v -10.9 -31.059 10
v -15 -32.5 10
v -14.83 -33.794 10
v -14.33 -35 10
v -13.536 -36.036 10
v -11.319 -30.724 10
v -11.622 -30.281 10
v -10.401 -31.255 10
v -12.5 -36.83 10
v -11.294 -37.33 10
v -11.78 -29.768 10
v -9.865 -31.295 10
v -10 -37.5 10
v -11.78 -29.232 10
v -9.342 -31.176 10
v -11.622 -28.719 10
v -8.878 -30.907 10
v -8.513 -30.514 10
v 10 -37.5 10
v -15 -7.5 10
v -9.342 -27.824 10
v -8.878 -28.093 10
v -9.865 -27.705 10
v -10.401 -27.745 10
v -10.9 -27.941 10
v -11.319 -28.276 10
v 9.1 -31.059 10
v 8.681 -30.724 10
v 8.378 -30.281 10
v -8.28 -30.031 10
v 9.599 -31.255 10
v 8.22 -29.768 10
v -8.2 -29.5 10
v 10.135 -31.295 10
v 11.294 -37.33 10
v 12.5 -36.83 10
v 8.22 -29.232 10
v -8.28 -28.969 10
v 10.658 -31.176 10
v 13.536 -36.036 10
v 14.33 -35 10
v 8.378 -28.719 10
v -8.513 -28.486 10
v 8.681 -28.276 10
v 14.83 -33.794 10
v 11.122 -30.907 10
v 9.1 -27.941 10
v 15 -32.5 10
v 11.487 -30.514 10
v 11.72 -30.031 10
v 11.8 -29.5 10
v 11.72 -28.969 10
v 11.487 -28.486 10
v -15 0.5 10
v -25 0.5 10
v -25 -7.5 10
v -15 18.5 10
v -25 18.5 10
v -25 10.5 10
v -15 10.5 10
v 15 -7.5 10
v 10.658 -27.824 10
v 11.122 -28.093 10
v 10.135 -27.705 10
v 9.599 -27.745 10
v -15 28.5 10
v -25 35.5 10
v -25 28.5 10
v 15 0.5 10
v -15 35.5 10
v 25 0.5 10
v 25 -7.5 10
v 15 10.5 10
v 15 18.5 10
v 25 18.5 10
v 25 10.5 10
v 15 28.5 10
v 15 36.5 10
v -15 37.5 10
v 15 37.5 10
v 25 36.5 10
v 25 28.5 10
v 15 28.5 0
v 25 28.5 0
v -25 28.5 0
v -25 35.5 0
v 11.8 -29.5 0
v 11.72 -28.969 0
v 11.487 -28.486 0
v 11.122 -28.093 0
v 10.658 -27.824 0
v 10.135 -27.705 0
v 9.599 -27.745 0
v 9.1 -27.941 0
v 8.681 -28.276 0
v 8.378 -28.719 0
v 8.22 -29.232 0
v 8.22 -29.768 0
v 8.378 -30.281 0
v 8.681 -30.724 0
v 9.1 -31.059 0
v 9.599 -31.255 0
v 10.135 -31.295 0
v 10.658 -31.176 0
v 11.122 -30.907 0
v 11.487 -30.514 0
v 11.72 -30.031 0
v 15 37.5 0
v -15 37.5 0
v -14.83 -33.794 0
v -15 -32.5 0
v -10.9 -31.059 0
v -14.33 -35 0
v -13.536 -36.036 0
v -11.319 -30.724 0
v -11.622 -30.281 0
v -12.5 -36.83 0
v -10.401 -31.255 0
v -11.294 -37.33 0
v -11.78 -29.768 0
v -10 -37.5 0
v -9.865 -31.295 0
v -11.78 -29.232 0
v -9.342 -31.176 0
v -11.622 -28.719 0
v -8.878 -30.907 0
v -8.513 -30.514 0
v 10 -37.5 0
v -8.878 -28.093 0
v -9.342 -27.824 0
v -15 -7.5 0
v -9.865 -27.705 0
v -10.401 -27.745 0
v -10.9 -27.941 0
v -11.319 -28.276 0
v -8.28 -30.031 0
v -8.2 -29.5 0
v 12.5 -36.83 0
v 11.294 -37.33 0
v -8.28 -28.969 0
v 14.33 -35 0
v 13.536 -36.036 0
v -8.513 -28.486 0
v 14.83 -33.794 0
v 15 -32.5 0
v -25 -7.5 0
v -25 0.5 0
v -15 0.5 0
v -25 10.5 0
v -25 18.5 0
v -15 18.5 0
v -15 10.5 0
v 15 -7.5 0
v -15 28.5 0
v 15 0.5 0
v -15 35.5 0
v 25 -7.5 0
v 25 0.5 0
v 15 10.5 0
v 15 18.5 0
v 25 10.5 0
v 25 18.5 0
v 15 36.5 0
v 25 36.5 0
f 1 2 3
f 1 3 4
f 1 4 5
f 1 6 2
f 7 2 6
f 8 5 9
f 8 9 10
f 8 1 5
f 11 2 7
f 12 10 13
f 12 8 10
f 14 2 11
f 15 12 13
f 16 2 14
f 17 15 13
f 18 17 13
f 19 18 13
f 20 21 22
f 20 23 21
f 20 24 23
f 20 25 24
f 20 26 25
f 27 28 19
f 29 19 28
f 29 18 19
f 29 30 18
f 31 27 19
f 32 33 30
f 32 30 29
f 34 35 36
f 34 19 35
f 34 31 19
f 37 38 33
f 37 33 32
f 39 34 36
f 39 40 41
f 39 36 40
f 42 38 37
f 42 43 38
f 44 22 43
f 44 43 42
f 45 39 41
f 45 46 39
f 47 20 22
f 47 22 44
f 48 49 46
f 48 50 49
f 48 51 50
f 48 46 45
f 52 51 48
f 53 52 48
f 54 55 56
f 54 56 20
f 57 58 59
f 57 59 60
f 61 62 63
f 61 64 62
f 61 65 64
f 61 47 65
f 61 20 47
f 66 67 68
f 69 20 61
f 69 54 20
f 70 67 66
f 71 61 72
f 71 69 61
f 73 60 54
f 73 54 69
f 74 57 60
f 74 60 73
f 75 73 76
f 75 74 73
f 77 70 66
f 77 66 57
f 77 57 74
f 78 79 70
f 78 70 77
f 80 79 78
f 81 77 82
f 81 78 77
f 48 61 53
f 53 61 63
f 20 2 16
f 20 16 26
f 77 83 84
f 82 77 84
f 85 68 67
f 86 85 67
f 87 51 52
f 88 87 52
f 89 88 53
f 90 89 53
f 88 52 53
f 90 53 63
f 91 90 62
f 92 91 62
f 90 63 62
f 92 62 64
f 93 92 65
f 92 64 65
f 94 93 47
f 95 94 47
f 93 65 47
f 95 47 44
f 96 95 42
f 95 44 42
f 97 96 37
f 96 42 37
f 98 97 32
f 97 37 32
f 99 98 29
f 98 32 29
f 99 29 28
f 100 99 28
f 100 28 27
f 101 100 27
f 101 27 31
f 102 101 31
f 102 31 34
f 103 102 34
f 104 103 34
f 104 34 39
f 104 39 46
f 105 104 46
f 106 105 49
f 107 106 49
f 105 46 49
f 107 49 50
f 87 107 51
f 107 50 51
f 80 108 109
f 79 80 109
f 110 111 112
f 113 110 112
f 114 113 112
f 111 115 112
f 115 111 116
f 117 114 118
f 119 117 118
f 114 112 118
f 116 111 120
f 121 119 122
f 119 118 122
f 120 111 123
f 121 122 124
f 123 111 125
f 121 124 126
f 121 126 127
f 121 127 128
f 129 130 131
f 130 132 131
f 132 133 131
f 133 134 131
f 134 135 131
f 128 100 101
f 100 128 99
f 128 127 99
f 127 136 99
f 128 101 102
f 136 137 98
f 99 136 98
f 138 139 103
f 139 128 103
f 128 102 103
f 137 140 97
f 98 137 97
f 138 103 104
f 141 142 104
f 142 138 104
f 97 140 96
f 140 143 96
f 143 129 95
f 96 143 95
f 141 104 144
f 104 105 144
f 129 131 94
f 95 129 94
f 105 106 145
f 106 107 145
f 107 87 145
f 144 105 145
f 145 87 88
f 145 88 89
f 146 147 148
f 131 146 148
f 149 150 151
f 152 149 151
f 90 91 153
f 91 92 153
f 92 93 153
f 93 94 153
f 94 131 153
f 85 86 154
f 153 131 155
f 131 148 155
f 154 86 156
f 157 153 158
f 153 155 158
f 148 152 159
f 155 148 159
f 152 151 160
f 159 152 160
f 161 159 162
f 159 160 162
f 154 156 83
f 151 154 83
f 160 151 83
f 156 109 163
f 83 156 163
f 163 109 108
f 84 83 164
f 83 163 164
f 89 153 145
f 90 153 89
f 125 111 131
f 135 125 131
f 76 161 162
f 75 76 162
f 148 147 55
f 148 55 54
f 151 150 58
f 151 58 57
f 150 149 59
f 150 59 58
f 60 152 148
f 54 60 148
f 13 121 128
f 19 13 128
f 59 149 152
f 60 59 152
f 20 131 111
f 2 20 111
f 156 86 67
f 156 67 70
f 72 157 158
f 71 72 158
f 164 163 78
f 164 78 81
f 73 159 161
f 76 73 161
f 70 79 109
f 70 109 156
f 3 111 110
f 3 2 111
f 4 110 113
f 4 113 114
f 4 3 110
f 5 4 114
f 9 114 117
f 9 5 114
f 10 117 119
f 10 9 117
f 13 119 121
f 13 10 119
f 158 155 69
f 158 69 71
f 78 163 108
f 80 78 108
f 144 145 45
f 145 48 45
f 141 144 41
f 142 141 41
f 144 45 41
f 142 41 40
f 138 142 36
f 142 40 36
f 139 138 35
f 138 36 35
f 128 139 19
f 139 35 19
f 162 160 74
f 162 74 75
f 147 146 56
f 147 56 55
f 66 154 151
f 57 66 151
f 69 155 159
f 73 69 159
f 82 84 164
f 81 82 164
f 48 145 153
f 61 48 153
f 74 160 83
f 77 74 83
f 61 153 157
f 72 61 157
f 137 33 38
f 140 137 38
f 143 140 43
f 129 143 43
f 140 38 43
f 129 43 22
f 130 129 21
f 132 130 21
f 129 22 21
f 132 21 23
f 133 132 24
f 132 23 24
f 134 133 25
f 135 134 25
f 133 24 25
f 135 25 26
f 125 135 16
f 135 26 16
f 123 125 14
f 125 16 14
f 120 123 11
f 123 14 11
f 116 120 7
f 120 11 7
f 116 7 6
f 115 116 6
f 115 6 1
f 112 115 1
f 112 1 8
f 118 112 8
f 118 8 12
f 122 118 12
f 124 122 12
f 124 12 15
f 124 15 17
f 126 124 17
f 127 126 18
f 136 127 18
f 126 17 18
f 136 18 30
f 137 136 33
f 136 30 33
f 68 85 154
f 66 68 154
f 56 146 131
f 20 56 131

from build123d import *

# Parameters (mm, degrees)
F0_W     = 10
F0_H     = 8
F0_H_2   = 7
F1_DEPTH = 10
F2_R     = 1.8
F3_DEPTH = 10
F4_R     = 5


with BuildPart() as f1:
    # F0 (on Top) → F1 (new body)
    with BuildSketch(Plane.XY):
        Polygon((15, 36.5), (15, 37.5), (-15, 37.5), (-15, 35.5), (-15, 28.5), (-15, 18.5), (-15, 10.5), (-15, 0.5), (-15, -7.5), (-15, -37.5), (15, -37.5), (15, -7.5), (15, 0.5), (15, 10.5), (15, 18.5), (15, 28.5), align=None)
        with Locations((20, 32.5)):
            Rectangle(F0_W, F0_H)
        with Locations((-20, 32)):
            Rectangle(F0_W, F0_H_2)
        with Locations((20, 14.5)):
            Rectangle(F0_W, F0_H)
        with Locations((-20, 14.5)):
            Rectangle(F0_W, F0_H)
        with Locations((20, -3.5)):
            Rectangle(F0_W, F0_H)
        with Locations((-20, -3.5)):
            Rectangle(F0_W, F0_H)
    extrude(amount=F1_DEPTH)

    # F2 (on face) → F3 (cut)
    with BuildSketch(Plane.XY.offset(10)):
        with Locations((-10, -29.5)):
            Circle(F2_R)
        with Locations((10, -29.5)):
            Circle(F2_R)
    extrude(amount=-F3_DEPTH, mode=Mode.SUBTRACT)

    # F4
    f4_edges = [f1.edges().sort_by_distance(p)[0] for p in [
        (15, -37.5, 5),
        (-15, -37.5, 5),
    ]]
    fillet(f4_edges, radius=F4_R)


solid = f1.part
